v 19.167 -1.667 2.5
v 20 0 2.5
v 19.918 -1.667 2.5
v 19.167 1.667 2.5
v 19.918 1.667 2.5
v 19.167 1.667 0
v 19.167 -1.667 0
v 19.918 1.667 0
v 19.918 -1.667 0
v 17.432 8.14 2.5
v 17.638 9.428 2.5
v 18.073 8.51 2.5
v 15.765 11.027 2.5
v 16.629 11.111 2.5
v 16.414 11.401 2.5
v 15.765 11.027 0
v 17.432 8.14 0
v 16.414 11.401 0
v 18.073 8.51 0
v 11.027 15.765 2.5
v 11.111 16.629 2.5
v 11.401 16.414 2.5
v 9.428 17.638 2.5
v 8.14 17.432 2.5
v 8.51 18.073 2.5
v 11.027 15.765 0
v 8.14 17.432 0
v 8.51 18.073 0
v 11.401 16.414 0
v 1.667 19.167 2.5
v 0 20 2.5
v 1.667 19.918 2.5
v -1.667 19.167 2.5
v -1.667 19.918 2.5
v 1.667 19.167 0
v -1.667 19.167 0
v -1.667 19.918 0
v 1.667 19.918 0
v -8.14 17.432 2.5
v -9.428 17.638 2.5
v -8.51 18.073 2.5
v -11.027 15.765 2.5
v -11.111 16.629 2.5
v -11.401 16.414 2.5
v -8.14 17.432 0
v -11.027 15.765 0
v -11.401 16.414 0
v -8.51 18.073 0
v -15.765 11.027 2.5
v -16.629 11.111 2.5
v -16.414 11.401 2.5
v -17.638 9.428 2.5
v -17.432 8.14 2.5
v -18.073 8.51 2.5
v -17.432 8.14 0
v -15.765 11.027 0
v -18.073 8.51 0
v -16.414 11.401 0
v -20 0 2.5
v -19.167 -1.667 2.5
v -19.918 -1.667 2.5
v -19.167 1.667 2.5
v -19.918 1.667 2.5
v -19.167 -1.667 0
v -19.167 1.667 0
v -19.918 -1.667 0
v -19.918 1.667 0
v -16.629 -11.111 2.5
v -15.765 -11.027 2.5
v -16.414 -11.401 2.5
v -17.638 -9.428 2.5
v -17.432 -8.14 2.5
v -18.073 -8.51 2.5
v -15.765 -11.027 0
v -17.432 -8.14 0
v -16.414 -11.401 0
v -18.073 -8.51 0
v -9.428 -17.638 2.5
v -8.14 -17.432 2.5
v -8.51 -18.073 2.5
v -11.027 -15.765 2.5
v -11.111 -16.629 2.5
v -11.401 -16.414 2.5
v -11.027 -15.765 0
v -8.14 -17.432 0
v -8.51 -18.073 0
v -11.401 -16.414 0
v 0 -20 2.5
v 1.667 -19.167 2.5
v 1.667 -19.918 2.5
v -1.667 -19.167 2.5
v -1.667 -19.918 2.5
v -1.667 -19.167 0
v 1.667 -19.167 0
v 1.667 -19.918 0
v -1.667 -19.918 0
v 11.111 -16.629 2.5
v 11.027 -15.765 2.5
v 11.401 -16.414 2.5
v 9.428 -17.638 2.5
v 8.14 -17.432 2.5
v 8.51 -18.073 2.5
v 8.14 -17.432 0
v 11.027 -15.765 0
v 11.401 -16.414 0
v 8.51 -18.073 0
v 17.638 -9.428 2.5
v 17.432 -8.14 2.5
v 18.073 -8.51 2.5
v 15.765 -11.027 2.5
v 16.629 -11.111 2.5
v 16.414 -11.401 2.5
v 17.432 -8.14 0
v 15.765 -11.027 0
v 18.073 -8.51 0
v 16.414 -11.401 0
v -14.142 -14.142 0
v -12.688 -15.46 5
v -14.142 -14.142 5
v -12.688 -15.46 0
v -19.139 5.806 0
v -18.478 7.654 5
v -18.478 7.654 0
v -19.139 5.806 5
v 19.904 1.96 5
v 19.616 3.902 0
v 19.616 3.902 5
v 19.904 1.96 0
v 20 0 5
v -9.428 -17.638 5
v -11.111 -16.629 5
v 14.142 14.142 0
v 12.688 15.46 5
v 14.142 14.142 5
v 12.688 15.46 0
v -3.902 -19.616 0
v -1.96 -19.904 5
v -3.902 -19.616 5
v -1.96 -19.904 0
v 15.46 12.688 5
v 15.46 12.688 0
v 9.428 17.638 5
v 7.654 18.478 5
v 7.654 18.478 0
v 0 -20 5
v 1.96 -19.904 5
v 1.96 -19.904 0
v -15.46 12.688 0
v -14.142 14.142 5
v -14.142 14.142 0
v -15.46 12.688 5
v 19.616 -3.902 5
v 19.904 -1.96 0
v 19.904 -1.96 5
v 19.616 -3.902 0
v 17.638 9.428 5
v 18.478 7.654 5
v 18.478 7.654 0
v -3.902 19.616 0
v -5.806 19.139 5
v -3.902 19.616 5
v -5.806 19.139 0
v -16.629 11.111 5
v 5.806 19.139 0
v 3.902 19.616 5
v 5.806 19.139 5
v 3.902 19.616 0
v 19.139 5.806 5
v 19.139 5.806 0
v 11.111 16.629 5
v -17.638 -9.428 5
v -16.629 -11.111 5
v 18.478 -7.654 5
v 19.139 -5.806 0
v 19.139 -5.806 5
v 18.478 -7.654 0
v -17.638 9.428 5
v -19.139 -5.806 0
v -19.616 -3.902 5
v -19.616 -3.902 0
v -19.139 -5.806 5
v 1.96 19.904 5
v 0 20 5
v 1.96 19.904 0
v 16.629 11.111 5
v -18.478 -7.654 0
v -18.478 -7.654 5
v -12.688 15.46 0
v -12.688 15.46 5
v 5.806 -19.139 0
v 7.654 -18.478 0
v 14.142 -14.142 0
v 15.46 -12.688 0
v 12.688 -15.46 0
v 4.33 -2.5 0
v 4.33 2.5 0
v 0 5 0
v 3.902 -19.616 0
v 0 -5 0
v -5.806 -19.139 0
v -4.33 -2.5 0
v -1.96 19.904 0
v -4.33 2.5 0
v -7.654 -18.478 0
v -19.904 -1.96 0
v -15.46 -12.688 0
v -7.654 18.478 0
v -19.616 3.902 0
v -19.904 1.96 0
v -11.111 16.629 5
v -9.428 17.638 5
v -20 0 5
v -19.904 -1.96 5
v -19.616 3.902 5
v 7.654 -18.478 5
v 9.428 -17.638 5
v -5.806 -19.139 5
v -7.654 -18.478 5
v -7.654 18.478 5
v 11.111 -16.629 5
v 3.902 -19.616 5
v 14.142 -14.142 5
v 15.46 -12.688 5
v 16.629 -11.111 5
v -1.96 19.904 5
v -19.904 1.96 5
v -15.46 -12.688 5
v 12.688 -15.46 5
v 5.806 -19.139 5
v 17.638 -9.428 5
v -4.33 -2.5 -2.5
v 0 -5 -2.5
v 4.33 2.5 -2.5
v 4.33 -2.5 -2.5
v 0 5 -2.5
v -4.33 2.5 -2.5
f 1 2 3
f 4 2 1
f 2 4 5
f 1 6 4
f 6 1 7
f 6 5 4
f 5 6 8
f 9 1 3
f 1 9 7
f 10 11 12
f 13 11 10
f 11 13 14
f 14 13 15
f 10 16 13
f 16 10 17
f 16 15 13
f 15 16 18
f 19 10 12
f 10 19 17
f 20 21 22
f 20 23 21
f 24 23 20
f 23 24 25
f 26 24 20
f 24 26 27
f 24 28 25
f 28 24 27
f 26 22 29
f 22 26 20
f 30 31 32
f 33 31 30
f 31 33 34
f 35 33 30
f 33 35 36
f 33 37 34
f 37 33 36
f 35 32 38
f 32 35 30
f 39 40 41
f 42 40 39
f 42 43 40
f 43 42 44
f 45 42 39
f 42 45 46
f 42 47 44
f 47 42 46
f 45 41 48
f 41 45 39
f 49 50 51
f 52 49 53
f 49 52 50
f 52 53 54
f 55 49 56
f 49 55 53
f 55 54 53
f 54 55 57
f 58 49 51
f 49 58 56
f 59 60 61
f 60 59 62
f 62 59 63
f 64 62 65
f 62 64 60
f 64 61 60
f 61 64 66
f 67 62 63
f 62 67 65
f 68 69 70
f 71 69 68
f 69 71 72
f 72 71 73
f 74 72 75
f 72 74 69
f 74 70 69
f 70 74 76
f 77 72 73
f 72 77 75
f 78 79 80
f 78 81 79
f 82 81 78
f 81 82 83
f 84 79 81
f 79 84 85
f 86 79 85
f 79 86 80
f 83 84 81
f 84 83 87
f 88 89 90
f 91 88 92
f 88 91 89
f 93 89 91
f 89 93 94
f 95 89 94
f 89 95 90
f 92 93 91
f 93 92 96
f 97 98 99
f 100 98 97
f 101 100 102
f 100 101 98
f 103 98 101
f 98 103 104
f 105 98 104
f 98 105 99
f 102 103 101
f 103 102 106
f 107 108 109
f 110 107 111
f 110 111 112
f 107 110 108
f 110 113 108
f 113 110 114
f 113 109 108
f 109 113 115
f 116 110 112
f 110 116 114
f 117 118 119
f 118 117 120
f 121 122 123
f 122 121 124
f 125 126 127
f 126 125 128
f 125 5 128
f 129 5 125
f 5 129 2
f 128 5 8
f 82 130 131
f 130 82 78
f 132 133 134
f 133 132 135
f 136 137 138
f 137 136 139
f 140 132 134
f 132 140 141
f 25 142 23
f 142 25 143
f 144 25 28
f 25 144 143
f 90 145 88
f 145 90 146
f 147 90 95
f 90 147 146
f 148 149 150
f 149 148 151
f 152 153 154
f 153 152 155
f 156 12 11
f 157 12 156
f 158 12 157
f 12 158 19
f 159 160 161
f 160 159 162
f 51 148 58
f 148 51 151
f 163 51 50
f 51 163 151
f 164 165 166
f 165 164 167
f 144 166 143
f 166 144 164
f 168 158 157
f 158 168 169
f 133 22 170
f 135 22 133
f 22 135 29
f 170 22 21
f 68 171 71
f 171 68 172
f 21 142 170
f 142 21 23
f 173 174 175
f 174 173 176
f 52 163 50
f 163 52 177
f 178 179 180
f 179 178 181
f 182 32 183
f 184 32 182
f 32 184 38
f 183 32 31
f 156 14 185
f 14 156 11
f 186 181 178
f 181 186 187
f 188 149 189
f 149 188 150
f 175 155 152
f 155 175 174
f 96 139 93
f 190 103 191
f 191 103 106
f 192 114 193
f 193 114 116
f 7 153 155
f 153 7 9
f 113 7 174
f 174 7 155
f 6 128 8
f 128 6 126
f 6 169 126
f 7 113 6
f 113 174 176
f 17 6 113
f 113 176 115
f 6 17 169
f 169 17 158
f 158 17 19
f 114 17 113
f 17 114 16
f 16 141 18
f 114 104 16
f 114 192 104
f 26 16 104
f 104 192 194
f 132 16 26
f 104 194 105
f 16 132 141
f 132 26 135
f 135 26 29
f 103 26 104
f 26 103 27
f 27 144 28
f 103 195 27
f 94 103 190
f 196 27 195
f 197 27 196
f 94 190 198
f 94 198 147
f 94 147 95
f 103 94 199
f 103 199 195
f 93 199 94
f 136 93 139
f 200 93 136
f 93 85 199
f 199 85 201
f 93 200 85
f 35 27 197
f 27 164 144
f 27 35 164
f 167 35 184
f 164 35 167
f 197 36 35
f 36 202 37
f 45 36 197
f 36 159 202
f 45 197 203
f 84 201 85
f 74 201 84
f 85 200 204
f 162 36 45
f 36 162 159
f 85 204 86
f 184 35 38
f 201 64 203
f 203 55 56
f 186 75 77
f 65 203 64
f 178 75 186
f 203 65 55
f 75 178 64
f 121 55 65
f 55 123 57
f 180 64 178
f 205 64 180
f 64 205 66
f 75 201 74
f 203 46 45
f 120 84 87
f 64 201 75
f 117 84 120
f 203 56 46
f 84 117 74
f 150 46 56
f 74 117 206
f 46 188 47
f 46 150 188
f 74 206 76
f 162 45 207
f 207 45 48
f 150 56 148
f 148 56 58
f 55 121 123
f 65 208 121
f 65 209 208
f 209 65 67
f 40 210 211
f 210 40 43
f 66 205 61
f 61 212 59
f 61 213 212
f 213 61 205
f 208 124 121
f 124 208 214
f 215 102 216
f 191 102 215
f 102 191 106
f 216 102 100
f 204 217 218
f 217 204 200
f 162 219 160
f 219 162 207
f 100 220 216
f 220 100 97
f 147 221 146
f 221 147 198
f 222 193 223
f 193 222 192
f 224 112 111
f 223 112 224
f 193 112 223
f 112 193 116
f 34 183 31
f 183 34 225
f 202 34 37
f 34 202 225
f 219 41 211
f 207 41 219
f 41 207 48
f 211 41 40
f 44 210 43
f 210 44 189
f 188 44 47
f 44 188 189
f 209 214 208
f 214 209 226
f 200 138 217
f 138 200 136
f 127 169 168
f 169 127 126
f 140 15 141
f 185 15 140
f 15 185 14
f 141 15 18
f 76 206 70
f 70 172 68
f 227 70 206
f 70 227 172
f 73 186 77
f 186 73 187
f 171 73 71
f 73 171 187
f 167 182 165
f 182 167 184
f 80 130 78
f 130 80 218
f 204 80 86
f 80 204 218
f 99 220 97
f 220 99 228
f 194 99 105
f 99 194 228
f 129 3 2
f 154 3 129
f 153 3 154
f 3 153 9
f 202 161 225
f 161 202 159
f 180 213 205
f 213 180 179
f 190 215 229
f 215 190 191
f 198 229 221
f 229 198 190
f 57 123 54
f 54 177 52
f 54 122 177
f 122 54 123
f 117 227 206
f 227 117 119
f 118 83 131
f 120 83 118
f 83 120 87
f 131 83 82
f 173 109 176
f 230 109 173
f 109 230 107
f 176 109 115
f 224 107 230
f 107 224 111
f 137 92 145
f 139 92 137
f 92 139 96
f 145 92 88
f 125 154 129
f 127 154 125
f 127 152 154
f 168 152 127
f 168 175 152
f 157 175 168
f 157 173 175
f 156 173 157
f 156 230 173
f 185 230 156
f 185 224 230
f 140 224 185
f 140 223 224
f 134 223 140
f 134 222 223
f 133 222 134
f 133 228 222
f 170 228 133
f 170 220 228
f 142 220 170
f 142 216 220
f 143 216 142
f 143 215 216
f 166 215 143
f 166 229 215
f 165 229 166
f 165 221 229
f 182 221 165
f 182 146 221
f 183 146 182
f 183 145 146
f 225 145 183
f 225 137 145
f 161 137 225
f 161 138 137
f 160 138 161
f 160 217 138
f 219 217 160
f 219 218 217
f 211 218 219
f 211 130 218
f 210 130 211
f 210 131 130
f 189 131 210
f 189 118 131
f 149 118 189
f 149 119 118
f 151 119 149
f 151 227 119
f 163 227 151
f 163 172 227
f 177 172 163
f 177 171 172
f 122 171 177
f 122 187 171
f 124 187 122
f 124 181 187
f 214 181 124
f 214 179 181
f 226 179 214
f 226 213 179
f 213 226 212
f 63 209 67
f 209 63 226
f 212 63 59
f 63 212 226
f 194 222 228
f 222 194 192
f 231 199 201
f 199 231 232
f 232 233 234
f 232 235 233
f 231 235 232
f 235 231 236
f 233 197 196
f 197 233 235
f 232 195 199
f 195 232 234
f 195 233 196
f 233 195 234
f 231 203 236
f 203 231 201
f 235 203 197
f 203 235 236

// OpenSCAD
module spur_gear_with_hex_bore(teeth=12, radius=20, thickness=5, hex_size=10) {
    gear_teeth(teeth, radius, thickness);
    hex_bore(hex_size, thickness);
}

module gear_teeth(teeth, radius, thickness) {
    difference() {
        cylinder(r=radius, h=thickness, $fn=64);
        for (i = [0:teeth-1]) {
            rotate([0, 0, i * 360 / teeth])
            translate([radius, 0, 0])
            cube([radius / teeth, 2 * radius / teeth, thickness], center=true);
        }
    }
}

module hex_bore(size, thickness) {
    rotate([0, 0, 90])
    translate([0, 0, -thickness/2])
    linear_extrude(height=thickness)
    polygon(points=[
        [size/2, 0],
        [size/4, size * sqrt(3)/4],
        [-size/4, size * sqrt(3)/4],
        [-size/2, 0],
        [-size/4, -size * sqrt(3)/4],
        [size/4, -size * sqrt(3)/4]
    ]);
}

spur_gear_with_hex_bore();
